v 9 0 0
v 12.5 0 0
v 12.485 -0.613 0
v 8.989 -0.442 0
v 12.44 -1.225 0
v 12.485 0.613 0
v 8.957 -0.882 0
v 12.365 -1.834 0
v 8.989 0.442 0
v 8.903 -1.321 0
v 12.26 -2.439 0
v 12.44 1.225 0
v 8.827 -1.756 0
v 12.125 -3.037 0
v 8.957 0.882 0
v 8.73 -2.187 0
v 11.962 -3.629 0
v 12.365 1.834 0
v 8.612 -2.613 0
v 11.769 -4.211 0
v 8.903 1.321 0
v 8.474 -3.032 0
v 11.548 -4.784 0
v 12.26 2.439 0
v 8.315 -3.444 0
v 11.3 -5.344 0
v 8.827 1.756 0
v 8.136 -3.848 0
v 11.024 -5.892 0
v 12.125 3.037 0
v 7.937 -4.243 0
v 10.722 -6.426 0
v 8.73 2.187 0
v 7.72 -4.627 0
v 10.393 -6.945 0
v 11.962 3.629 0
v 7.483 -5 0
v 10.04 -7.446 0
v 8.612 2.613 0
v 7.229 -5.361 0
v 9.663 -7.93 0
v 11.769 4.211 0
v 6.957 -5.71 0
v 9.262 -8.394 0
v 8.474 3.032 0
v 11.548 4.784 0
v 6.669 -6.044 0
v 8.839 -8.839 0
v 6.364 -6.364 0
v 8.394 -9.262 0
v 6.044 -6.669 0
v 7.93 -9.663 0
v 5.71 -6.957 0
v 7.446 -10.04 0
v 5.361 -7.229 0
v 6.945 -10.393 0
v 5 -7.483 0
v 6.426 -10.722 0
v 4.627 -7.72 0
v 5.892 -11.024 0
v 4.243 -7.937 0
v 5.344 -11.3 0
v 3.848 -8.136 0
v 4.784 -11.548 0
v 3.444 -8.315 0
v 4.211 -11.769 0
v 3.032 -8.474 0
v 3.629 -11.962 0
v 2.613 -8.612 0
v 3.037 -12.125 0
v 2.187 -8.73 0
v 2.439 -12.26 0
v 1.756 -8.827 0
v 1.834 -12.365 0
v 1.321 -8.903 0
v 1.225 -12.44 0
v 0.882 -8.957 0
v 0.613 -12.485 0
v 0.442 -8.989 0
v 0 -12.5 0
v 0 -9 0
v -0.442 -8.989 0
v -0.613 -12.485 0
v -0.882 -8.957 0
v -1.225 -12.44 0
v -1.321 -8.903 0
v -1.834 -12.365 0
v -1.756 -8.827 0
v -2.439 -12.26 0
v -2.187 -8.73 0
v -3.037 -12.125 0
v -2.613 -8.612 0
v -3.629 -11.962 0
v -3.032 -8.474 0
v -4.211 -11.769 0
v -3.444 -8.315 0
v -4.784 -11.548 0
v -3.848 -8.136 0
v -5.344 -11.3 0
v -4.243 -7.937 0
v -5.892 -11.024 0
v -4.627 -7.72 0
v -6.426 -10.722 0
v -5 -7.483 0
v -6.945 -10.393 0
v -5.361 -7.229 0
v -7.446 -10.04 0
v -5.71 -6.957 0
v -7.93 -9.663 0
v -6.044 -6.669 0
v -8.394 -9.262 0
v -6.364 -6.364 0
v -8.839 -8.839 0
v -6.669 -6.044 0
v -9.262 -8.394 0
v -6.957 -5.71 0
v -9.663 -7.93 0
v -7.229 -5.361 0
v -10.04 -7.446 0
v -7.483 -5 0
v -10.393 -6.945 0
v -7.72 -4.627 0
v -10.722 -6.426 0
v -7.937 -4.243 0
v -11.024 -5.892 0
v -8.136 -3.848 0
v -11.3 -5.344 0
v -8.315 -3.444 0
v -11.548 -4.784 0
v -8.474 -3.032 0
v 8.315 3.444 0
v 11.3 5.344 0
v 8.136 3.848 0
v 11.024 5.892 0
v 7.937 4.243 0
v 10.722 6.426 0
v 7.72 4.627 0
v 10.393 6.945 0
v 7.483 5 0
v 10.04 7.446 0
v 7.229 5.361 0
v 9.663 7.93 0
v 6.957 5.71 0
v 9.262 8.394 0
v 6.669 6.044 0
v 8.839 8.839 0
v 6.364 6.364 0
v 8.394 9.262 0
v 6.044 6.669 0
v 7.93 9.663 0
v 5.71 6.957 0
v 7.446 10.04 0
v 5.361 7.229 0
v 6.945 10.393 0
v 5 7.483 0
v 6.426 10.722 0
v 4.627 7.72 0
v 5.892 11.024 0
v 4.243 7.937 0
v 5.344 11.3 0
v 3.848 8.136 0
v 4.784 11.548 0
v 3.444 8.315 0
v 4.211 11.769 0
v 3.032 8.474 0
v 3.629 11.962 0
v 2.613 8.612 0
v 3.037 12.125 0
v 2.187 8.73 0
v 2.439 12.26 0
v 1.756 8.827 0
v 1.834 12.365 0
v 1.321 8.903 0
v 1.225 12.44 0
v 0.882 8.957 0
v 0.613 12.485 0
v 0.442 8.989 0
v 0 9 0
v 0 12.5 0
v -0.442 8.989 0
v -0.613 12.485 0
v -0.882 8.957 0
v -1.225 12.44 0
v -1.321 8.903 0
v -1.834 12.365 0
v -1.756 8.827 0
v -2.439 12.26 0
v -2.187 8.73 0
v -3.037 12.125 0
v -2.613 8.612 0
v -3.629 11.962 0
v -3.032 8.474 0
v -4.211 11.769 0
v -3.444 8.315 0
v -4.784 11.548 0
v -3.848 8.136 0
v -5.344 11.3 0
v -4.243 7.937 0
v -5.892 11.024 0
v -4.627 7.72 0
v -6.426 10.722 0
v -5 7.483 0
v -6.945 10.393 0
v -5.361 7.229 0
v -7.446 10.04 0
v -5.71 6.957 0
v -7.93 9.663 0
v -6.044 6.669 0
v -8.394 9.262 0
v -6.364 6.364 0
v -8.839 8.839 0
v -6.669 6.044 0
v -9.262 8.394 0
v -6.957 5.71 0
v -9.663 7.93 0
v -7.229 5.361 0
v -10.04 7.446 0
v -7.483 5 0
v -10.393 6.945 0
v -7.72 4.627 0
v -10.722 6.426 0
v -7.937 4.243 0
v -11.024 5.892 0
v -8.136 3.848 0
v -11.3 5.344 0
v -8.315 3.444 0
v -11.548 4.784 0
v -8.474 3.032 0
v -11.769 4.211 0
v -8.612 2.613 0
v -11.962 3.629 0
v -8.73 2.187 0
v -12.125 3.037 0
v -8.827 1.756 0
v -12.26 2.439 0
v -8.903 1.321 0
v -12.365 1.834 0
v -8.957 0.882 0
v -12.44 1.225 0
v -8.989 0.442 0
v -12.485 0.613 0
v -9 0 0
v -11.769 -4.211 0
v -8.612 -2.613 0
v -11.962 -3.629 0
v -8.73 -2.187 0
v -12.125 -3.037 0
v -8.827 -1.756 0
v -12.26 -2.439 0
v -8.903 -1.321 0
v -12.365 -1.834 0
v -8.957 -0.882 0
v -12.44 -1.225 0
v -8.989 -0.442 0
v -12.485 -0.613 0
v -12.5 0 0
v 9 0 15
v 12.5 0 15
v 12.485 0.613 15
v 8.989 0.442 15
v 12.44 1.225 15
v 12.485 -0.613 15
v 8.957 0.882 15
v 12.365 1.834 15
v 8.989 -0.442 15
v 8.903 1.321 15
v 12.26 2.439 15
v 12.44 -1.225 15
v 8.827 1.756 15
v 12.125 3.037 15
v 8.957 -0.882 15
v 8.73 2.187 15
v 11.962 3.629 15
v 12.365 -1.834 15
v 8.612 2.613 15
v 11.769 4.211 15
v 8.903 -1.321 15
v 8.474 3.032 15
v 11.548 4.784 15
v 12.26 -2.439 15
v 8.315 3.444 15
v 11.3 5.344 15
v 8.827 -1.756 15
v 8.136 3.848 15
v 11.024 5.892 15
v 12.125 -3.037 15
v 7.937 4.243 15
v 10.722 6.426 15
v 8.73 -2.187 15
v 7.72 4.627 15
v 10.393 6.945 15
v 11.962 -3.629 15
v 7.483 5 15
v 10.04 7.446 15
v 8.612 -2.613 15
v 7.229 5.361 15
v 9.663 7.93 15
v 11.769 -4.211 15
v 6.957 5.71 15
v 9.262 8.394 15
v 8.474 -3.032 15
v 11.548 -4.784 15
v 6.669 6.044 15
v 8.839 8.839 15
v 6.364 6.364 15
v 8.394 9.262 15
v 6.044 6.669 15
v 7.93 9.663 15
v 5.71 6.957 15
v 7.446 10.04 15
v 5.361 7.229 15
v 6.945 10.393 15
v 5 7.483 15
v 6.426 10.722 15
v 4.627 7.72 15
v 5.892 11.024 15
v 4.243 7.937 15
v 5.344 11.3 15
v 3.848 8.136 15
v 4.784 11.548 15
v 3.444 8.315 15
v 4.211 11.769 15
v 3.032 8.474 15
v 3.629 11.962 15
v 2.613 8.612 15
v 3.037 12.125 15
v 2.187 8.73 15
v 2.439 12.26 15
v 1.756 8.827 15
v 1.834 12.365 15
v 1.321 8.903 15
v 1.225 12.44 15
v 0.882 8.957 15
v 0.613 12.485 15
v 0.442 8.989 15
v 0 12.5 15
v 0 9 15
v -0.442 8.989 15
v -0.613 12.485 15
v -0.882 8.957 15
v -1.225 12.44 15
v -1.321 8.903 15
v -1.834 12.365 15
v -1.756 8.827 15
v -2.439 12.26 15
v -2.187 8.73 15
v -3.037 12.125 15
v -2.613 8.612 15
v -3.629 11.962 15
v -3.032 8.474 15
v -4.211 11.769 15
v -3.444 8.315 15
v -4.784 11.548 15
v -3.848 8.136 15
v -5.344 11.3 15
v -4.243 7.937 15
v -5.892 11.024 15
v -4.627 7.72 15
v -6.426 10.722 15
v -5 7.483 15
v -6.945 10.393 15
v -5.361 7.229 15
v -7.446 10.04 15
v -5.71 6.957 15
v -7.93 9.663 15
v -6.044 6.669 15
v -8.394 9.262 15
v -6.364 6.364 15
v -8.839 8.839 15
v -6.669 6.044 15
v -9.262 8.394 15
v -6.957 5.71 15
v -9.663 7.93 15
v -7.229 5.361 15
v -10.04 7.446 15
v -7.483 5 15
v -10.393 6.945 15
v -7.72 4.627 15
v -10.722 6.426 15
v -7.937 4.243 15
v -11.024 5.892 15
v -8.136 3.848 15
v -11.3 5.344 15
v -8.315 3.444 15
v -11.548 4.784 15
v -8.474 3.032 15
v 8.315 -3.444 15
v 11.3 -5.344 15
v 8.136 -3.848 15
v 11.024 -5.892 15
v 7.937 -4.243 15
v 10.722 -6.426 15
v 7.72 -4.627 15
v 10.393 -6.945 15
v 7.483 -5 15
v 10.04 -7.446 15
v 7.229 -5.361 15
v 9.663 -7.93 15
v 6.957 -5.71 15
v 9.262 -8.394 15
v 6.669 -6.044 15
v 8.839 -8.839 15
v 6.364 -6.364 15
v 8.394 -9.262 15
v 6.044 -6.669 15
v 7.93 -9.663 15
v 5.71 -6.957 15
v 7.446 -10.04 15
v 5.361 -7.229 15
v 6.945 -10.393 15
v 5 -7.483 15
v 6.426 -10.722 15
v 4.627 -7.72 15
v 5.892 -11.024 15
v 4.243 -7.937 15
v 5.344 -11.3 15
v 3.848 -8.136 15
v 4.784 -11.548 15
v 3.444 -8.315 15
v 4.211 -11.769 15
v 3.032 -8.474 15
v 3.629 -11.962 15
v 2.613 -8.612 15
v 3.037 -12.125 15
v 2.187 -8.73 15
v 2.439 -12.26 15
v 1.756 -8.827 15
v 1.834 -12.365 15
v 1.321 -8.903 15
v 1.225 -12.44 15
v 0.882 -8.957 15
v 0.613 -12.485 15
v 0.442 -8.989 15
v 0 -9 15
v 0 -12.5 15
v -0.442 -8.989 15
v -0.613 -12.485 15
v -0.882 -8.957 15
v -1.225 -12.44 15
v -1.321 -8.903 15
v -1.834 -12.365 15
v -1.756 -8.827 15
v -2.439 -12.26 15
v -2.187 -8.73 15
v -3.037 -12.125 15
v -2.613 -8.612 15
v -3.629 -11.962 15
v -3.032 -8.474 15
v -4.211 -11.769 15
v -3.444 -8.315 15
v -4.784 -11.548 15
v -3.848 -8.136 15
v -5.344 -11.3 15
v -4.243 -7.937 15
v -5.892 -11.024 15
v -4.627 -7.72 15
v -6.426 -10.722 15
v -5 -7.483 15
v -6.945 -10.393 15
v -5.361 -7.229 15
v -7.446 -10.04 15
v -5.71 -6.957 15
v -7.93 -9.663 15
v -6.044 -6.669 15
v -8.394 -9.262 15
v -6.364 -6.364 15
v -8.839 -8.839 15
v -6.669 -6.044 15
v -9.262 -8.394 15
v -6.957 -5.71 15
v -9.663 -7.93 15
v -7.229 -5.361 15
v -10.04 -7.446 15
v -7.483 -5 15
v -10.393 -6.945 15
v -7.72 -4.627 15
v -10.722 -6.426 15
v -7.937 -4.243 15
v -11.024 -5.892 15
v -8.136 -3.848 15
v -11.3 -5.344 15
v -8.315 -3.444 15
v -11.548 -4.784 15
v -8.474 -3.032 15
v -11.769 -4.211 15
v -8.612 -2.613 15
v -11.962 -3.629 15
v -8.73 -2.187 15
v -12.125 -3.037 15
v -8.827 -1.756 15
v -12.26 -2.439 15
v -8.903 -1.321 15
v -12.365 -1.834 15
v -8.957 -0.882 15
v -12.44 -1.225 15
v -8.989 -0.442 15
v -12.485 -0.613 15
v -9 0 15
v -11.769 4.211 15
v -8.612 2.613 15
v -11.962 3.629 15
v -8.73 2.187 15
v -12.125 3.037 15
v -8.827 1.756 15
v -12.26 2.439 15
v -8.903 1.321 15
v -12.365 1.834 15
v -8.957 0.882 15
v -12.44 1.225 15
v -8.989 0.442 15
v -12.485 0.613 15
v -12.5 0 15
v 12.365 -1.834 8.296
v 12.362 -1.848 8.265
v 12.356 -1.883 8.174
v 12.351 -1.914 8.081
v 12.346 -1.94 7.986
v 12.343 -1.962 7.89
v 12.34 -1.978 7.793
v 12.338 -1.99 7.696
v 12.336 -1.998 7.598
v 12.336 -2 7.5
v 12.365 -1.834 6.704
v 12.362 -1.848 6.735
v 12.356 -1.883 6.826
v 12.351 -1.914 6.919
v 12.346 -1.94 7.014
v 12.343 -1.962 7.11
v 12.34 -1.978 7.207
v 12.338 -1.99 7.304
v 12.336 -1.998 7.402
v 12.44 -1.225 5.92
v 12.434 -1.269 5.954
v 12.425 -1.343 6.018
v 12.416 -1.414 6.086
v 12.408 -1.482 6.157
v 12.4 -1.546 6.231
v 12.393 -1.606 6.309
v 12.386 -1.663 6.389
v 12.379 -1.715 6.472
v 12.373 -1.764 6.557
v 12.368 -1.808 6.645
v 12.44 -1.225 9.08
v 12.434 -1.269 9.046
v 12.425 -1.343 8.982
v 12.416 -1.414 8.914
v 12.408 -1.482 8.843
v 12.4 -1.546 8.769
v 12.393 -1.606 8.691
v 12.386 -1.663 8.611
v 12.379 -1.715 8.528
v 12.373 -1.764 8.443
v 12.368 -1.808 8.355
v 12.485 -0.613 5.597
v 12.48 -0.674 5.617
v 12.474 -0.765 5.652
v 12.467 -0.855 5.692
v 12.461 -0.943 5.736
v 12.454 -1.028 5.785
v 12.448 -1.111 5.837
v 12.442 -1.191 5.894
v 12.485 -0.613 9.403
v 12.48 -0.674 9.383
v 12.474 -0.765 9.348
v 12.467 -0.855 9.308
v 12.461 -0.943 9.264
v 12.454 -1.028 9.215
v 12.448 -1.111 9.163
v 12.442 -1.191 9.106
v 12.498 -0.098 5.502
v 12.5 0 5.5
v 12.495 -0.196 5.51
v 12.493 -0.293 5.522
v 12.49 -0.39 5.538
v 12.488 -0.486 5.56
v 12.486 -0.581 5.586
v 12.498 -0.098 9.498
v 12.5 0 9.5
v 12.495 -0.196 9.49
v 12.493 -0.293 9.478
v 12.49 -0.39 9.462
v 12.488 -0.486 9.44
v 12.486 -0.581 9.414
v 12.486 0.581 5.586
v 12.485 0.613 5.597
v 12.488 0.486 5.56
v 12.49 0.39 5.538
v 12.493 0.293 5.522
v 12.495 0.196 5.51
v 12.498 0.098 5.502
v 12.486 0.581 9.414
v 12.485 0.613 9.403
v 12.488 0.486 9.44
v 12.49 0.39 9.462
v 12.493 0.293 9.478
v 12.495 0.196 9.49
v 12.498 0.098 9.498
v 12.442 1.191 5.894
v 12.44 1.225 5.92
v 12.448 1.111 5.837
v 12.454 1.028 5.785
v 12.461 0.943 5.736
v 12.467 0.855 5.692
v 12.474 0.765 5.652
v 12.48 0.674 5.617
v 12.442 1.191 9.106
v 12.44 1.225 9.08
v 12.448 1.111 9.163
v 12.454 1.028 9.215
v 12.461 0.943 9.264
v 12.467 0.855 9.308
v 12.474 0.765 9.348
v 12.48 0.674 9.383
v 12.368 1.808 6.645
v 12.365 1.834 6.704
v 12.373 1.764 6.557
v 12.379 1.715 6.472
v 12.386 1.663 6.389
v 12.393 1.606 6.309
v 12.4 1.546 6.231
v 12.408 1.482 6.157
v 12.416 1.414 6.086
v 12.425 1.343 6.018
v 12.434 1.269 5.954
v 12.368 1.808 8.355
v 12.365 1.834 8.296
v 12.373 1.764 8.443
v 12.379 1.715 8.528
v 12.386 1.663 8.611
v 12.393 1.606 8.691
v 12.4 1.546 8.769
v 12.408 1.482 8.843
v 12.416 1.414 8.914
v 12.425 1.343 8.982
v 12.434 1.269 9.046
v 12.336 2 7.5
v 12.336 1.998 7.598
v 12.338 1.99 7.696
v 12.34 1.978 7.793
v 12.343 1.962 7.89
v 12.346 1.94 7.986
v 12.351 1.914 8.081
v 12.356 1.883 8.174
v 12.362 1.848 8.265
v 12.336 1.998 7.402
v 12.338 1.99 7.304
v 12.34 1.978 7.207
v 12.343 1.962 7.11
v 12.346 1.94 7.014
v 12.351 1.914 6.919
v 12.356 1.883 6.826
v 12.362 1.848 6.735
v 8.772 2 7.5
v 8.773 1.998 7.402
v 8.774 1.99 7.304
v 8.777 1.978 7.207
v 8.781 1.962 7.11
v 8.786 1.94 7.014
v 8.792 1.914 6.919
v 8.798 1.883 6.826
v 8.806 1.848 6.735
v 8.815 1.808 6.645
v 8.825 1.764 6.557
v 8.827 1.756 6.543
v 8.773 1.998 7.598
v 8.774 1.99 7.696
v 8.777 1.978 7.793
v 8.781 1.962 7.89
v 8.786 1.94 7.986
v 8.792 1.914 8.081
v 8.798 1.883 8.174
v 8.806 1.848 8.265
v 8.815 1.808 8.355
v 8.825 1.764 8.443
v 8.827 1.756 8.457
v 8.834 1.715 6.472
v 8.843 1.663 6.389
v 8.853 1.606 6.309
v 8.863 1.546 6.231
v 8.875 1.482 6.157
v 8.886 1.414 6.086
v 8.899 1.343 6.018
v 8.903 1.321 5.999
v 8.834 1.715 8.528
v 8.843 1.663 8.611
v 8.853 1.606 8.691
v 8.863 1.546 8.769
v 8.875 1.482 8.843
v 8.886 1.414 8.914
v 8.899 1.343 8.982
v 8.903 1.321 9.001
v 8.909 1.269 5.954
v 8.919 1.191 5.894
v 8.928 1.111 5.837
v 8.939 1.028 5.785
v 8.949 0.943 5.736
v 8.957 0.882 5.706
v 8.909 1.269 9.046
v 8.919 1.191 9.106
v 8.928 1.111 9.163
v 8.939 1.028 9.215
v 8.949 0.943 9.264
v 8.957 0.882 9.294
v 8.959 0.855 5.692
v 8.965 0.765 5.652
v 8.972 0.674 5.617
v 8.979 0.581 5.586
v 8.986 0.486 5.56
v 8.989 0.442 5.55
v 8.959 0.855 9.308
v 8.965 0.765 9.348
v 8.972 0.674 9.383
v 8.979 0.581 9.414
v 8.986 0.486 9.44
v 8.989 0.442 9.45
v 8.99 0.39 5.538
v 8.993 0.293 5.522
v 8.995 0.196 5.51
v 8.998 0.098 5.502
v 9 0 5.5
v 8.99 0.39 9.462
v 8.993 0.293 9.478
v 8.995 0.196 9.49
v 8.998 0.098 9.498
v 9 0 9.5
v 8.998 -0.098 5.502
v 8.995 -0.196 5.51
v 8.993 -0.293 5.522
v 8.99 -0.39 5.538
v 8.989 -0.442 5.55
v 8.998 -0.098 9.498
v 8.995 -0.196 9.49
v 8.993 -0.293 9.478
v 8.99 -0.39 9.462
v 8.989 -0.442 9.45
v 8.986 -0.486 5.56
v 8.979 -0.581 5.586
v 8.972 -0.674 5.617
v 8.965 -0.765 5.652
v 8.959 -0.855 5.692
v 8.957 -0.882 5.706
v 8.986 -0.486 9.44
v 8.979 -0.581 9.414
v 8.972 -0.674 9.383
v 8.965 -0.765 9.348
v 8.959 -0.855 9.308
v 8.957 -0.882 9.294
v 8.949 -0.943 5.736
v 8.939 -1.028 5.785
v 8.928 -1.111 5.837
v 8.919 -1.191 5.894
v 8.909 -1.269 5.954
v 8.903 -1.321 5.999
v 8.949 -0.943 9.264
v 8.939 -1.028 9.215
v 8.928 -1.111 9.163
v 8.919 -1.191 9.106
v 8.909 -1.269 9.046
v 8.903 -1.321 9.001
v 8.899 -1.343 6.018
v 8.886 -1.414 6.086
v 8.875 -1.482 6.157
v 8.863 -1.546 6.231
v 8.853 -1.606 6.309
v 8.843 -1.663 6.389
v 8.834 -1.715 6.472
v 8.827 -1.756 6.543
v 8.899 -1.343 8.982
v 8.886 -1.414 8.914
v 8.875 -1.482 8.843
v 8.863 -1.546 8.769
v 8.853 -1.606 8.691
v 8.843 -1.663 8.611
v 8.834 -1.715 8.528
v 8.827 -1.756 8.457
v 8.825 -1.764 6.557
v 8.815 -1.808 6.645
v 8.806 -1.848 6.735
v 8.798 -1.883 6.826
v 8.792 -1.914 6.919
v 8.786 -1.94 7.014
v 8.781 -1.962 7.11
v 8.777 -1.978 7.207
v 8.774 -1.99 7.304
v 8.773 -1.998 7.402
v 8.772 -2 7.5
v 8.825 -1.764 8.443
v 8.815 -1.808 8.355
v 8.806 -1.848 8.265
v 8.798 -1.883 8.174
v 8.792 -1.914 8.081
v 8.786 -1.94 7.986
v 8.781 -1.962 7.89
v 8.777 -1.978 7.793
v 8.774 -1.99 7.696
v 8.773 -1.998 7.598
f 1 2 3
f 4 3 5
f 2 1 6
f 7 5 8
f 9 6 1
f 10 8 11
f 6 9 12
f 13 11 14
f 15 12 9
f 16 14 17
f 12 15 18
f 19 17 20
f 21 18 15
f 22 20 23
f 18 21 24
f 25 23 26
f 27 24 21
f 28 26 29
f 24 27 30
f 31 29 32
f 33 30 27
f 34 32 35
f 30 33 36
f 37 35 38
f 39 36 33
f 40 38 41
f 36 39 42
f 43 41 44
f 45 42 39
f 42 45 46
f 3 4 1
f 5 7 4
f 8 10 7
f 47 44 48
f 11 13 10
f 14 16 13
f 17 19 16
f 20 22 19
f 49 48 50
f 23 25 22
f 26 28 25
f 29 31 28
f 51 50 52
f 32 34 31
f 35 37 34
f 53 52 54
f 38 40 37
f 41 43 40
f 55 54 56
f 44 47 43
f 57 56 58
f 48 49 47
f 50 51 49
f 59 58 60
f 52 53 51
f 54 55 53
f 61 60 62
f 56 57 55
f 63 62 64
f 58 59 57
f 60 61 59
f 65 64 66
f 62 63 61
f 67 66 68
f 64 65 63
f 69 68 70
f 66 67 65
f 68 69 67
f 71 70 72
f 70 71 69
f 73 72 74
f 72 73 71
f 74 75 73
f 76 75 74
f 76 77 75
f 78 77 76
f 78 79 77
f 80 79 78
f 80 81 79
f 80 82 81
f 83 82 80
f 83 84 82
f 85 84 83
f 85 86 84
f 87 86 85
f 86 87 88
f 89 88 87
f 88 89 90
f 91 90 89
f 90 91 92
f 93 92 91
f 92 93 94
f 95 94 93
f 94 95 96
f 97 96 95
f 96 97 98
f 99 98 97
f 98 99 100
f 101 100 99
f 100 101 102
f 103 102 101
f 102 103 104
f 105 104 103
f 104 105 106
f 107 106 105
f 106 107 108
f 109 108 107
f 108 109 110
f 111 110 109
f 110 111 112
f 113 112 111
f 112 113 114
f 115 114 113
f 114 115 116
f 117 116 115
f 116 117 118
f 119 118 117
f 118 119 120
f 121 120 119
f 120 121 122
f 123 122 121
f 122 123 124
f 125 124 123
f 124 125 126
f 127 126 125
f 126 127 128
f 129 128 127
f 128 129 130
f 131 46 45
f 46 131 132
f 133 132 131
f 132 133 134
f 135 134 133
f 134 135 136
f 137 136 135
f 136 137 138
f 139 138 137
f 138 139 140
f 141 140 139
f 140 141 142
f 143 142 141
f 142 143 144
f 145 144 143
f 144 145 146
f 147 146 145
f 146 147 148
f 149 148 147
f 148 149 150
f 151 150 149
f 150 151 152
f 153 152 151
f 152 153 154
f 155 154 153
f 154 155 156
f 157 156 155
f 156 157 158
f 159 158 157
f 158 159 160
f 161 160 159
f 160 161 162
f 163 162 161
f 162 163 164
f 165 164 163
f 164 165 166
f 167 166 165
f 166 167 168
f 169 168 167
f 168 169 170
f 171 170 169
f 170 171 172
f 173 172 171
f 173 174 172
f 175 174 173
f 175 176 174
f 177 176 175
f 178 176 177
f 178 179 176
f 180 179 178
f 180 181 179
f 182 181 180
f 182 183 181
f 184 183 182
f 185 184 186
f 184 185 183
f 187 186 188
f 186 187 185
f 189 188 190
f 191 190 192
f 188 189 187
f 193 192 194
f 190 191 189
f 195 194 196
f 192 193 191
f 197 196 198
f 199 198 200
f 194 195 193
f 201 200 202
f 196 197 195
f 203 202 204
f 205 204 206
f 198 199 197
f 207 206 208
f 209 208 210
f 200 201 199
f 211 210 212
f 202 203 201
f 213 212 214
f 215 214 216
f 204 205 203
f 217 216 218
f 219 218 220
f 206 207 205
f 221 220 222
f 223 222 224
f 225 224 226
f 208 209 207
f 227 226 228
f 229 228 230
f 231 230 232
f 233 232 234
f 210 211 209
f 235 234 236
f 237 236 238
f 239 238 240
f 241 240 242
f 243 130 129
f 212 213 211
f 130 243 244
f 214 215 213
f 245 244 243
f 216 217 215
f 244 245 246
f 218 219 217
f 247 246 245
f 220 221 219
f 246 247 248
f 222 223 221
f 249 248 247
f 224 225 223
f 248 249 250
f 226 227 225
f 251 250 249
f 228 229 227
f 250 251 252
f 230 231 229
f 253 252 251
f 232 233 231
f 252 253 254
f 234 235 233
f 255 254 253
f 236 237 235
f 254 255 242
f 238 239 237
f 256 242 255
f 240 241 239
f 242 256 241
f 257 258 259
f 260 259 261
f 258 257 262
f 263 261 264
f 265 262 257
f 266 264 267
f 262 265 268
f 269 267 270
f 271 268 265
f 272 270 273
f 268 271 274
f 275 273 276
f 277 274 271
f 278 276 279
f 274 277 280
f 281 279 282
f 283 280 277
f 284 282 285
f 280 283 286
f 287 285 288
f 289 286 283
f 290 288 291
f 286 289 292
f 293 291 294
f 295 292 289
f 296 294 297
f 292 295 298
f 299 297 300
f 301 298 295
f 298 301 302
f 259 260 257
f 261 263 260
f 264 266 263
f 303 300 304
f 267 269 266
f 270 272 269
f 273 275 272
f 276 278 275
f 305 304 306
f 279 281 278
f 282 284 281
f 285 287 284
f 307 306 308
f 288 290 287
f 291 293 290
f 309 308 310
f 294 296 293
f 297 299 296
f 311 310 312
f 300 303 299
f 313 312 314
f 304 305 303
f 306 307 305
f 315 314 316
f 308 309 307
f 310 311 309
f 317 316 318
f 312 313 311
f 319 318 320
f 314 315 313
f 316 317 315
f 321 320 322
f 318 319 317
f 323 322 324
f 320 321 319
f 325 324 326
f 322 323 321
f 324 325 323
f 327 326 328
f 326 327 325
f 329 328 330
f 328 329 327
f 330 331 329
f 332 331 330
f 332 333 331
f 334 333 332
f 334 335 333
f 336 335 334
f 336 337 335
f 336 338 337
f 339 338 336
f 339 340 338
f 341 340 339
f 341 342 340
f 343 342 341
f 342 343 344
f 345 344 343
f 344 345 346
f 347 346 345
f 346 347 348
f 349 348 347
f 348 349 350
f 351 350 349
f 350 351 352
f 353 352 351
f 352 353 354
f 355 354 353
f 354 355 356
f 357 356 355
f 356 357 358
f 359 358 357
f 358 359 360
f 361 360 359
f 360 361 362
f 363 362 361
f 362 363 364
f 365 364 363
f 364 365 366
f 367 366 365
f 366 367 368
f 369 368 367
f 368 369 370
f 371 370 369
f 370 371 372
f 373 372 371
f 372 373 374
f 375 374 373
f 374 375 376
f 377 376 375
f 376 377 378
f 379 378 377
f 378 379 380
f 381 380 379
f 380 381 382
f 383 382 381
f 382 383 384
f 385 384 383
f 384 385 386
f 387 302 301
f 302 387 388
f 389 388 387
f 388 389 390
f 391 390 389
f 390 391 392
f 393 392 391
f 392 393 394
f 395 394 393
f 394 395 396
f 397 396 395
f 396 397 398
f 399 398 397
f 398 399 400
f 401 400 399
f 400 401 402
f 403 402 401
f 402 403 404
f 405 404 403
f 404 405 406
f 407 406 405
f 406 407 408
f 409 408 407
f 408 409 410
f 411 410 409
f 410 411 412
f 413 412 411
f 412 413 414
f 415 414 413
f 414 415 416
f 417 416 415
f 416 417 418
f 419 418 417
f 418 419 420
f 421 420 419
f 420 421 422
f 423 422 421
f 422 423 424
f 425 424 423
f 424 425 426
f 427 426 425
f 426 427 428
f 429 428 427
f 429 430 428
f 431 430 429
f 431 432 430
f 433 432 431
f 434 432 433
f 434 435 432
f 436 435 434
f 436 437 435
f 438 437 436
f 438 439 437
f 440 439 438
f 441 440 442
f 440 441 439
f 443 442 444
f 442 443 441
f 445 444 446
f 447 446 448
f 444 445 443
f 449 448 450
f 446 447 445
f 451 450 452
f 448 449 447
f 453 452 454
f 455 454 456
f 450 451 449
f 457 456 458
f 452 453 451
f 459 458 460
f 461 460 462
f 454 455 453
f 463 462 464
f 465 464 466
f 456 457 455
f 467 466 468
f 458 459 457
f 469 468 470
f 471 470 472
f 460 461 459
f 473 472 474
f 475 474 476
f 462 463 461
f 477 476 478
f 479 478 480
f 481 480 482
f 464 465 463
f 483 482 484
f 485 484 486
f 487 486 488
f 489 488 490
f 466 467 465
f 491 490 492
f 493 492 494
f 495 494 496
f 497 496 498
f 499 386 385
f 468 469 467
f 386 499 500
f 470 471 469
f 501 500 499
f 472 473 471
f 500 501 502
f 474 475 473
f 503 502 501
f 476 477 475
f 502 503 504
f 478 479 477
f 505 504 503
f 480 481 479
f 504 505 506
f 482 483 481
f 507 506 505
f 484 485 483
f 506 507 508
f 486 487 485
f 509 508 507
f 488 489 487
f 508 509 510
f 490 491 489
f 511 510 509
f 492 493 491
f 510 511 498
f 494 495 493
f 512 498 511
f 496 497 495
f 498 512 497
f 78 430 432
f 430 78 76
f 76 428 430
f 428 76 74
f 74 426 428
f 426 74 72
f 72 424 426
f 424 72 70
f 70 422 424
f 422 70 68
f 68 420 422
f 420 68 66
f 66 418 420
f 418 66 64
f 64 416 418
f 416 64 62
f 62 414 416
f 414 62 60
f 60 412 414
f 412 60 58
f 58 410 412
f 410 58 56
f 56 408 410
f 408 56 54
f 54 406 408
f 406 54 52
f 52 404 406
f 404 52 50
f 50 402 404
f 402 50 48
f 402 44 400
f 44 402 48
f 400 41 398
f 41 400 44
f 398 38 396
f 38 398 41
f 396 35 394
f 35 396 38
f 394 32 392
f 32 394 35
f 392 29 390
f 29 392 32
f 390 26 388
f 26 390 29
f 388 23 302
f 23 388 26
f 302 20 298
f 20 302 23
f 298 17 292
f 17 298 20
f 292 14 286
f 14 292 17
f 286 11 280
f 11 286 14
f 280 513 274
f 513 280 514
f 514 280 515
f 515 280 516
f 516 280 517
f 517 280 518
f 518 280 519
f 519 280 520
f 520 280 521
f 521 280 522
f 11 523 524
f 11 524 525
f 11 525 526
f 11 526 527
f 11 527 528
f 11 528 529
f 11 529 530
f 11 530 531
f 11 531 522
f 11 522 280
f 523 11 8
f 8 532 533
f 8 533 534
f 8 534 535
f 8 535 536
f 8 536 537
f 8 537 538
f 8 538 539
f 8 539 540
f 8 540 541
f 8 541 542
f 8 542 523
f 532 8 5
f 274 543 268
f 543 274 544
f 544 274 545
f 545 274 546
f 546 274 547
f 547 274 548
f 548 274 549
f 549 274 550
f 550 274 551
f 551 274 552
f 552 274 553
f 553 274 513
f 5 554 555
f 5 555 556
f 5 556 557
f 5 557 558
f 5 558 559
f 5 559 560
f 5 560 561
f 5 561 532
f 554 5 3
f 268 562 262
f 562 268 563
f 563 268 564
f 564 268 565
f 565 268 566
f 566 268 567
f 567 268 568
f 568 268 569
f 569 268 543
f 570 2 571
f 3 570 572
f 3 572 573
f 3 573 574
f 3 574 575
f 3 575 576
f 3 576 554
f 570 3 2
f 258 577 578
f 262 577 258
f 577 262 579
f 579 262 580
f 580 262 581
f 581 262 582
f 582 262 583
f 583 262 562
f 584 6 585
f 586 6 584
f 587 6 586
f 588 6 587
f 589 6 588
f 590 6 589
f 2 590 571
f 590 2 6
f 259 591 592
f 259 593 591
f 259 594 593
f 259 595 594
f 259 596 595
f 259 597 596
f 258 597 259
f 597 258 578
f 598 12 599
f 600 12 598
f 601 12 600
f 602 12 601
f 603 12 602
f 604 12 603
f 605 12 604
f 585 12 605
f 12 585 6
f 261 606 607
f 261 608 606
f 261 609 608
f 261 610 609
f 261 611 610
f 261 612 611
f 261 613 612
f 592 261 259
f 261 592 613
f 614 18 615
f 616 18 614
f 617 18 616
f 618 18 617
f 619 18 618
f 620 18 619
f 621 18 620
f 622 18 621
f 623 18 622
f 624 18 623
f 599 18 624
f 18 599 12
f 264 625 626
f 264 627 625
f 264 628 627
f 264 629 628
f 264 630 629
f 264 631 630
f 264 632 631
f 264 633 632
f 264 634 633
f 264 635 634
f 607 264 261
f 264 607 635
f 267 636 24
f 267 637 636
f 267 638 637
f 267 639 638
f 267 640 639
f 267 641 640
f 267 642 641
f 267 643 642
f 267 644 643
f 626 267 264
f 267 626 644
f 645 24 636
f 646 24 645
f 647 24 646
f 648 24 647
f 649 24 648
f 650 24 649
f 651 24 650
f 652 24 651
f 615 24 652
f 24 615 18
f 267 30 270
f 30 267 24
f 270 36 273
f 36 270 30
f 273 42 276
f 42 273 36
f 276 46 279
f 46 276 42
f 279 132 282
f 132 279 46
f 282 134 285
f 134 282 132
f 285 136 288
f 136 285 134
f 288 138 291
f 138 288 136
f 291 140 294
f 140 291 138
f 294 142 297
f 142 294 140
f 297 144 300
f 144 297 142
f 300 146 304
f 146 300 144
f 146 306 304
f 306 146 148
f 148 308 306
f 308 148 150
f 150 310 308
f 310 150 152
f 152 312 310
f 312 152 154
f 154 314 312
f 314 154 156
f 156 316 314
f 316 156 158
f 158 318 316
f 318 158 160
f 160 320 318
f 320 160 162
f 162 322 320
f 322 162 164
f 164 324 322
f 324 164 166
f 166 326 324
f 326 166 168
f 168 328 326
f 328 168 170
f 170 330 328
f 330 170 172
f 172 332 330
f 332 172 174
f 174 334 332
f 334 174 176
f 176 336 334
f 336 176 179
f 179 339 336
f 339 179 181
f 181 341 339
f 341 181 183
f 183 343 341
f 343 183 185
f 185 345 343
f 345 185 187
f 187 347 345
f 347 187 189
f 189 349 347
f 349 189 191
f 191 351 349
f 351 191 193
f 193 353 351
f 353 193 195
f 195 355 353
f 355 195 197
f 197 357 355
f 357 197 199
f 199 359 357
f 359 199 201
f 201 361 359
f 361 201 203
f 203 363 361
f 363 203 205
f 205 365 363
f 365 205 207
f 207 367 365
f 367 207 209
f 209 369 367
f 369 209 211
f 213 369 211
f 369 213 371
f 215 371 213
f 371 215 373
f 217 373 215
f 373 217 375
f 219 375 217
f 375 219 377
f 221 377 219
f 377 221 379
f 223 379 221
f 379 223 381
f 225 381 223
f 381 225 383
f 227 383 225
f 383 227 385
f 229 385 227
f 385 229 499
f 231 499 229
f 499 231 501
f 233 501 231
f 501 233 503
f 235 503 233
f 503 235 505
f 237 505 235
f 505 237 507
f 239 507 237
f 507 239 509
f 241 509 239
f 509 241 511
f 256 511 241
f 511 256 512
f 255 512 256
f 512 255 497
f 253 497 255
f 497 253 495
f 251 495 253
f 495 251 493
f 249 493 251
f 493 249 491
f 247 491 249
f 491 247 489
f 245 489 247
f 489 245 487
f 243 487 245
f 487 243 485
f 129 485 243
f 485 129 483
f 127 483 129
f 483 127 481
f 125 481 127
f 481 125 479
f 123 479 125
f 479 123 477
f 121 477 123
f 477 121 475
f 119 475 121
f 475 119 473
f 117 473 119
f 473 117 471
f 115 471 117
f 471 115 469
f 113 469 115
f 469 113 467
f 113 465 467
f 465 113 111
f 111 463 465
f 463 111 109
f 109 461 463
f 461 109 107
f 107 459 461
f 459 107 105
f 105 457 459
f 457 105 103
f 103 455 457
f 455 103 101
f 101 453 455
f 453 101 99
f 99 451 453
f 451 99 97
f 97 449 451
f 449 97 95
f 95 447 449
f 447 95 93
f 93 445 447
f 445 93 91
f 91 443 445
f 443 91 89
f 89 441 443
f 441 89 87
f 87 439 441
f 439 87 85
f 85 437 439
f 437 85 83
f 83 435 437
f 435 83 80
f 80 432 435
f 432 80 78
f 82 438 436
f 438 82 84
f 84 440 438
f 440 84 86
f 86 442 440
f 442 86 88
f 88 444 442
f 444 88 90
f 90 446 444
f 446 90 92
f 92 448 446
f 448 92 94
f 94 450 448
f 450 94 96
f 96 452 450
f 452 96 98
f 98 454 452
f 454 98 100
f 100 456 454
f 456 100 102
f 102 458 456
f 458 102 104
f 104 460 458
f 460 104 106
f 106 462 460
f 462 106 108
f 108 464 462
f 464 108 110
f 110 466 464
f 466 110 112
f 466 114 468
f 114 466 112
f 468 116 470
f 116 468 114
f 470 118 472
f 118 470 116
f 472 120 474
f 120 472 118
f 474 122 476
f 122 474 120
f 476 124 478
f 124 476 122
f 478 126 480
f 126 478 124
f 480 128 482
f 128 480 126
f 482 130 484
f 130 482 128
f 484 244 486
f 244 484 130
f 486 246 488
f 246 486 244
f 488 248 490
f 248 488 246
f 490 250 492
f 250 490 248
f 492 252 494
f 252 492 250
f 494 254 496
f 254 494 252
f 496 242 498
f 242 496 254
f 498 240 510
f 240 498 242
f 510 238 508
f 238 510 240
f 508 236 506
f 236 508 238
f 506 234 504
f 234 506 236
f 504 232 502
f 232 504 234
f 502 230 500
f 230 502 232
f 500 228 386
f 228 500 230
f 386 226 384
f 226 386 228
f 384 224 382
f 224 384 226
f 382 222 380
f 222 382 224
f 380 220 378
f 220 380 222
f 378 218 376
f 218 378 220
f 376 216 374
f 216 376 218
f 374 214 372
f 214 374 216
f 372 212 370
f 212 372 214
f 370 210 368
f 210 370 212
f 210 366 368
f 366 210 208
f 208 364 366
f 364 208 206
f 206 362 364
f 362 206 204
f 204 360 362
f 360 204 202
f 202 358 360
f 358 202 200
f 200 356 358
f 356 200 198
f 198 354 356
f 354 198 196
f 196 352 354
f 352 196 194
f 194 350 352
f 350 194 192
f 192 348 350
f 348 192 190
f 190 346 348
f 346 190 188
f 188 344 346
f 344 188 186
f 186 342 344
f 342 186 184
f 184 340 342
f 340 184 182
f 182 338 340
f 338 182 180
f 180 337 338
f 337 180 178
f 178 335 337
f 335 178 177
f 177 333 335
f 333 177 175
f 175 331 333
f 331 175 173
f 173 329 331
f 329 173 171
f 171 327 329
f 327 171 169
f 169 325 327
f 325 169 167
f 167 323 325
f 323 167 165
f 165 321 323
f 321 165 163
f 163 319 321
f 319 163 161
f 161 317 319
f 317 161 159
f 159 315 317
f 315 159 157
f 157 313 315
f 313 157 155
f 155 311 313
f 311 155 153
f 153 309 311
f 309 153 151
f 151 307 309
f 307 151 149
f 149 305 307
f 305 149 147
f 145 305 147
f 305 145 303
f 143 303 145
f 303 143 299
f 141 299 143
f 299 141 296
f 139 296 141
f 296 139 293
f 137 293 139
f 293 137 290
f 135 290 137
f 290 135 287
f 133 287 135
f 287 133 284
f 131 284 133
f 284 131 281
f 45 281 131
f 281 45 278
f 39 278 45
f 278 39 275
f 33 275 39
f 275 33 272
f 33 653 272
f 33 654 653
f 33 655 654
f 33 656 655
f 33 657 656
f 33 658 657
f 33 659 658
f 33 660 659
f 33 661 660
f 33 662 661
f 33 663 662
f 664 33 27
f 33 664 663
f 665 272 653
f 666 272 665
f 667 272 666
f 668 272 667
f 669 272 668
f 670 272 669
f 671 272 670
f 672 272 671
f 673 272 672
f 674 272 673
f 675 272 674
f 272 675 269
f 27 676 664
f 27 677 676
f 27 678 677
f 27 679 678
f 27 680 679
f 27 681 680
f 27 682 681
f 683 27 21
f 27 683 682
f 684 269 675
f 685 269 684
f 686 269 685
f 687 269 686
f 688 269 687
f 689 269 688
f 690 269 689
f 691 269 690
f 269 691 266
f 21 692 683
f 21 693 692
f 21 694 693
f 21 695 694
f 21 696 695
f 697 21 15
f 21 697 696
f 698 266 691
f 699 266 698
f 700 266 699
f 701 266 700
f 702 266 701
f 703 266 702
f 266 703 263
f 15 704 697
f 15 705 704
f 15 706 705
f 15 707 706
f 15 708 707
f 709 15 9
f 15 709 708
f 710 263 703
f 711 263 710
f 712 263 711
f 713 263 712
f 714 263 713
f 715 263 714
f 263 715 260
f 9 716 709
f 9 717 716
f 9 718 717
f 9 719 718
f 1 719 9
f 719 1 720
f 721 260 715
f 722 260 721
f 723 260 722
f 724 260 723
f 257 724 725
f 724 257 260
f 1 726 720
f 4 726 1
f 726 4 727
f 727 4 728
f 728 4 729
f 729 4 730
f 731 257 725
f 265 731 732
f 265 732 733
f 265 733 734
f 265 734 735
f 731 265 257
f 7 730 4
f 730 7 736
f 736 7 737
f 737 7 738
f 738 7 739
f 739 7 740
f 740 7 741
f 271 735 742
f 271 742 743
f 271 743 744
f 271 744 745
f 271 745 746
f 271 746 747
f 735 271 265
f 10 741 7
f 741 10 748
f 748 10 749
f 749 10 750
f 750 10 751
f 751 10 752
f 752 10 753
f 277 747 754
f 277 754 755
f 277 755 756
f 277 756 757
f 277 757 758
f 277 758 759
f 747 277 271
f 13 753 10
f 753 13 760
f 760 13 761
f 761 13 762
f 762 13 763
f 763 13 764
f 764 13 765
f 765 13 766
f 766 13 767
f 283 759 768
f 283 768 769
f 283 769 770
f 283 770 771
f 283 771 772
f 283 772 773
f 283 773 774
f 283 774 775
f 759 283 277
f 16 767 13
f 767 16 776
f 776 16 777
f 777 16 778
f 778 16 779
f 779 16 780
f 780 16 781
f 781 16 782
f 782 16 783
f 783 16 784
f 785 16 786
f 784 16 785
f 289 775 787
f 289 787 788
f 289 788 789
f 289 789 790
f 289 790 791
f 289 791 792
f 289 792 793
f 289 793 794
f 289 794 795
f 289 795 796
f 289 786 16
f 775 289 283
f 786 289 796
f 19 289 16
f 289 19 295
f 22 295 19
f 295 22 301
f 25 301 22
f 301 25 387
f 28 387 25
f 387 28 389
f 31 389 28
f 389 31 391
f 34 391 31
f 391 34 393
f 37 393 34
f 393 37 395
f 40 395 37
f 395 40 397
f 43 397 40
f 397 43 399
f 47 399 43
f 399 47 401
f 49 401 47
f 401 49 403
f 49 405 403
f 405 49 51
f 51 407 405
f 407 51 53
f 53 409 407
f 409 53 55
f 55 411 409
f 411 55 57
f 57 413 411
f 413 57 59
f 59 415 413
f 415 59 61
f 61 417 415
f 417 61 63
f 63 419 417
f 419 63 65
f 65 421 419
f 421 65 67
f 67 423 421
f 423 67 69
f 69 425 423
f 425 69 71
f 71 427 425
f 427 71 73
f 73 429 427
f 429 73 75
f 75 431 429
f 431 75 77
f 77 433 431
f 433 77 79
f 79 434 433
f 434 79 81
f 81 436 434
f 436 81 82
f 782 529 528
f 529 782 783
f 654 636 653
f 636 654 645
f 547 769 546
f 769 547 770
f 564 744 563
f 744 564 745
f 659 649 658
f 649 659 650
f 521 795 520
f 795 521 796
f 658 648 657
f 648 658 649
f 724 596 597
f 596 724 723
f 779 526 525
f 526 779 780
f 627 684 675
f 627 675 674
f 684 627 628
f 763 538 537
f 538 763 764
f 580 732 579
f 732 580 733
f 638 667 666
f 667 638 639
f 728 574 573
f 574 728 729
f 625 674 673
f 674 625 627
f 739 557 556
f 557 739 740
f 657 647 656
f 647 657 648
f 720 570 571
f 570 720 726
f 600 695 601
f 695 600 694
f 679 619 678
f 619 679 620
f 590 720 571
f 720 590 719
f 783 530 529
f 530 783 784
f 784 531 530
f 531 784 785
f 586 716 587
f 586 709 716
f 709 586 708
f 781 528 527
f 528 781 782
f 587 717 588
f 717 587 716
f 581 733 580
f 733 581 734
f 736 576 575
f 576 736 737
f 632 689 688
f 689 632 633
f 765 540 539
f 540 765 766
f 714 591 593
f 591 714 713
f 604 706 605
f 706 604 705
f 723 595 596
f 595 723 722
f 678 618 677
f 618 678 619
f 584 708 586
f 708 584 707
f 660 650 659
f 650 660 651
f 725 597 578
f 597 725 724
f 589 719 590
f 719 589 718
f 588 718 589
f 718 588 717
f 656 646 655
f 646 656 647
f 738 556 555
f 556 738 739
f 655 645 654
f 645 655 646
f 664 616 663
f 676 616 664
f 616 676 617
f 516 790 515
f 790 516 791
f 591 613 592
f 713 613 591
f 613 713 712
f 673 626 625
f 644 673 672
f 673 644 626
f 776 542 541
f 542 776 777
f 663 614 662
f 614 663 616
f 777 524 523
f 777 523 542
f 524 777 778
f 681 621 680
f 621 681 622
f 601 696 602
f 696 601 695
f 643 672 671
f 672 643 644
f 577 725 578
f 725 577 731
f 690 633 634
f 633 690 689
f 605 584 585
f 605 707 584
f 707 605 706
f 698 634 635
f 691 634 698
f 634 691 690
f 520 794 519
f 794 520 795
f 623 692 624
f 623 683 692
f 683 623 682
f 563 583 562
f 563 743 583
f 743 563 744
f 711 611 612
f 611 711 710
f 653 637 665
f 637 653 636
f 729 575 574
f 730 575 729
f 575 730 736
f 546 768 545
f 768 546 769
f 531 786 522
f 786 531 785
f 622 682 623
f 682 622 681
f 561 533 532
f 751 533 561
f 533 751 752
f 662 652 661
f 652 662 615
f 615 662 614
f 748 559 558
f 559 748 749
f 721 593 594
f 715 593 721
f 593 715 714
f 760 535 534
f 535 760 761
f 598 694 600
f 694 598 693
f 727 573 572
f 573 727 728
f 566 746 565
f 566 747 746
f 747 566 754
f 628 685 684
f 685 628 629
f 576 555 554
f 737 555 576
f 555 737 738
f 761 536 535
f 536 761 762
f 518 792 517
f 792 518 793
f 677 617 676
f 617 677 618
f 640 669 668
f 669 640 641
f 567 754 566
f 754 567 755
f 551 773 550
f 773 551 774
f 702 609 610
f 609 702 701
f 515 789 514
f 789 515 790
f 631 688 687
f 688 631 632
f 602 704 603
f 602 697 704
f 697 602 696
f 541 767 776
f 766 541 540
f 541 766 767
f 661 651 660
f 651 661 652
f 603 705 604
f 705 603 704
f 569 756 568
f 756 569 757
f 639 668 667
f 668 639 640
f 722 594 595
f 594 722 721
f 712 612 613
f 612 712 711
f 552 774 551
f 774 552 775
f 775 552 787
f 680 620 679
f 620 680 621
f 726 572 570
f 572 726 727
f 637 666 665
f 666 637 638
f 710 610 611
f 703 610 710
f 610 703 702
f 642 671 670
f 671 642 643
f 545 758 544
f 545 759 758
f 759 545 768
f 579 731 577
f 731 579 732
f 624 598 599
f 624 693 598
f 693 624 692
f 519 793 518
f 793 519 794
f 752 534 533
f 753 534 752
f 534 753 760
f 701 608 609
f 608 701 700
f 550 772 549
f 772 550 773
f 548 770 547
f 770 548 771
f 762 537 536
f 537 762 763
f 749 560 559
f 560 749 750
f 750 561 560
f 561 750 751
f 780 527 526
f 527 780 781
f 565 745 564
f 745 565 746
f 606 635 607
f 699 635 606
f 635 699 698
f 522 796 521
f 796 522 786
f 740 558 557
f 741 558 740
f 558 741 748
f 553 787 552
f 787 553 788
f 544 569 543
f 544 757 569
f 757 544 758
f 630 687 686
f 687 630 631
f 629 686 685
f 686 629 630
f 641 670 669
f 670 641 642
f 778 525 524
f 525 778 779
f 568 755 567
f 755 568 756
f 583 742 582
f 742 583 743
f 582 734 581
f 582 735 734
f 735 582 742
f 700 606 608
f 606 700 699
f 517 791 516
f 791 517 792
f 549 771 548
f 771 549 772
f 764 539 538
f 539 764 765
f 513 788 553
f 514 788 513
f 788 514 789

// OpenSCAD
// file: config.scad
$fn = 128;


module hexagon(width) {
	diagonal = width * tan(30) + (width / 2) / cos(30);
	polygon(points = [
		[0, diagonal / 2],
		[width / 2,  width * tan(30) / 2],
		[width / 2, -width * tan(30) / 2],
		[0, -diagonal / 2],
		[-width / 2, -width * tan(30) / 2],
		[-width / 2,  width * tan(30) / 2],
	]);
}

switch_width = 14.5;
switch_height = 8;

bolt_hole_radius = 2.05;

bolt_hex_width = 8.3;
bolt_hex_length = 20;
bolt_mount_thickness = 3; 
bolt_mount_width = bolt_hex_width + bolt_mount_thickness * 2;
bolt_cap = 3;

laser_inset = 10;

radius_pinhole = 12.5;
pinhole_insert_thickness = 3.5;
pinhole_insert_height = 15;
pinhole_insert_insert_depth = 3;

led_mount_thickness = 15;
led_board_thickness = 5.5;
led_board_width = 11;
led_board_height = 16;

bolt_insert_radius = led_mount_thickness / 3 - pinhole_insert_insert_depth;
bolt_insert_depth = 3;
// main file
include <config.scad>
module pinhole_insert() {
    difference() {
        linear_extrude(pinhole_insert_height) difference() {
            circle(radius_pinhole);
            circle(radius_pinhole - pinhole_insert_thickness);
        }
        
        translate([radius_pinhole - pinhole_insert_thickness * 1.5, 0, pinhole_insert_height / 2]) rotate([0, 90, 0])
            cylinder(pinhole_insert_thickness * 2, 2, 2);
    }
}

pinhole_insert();
